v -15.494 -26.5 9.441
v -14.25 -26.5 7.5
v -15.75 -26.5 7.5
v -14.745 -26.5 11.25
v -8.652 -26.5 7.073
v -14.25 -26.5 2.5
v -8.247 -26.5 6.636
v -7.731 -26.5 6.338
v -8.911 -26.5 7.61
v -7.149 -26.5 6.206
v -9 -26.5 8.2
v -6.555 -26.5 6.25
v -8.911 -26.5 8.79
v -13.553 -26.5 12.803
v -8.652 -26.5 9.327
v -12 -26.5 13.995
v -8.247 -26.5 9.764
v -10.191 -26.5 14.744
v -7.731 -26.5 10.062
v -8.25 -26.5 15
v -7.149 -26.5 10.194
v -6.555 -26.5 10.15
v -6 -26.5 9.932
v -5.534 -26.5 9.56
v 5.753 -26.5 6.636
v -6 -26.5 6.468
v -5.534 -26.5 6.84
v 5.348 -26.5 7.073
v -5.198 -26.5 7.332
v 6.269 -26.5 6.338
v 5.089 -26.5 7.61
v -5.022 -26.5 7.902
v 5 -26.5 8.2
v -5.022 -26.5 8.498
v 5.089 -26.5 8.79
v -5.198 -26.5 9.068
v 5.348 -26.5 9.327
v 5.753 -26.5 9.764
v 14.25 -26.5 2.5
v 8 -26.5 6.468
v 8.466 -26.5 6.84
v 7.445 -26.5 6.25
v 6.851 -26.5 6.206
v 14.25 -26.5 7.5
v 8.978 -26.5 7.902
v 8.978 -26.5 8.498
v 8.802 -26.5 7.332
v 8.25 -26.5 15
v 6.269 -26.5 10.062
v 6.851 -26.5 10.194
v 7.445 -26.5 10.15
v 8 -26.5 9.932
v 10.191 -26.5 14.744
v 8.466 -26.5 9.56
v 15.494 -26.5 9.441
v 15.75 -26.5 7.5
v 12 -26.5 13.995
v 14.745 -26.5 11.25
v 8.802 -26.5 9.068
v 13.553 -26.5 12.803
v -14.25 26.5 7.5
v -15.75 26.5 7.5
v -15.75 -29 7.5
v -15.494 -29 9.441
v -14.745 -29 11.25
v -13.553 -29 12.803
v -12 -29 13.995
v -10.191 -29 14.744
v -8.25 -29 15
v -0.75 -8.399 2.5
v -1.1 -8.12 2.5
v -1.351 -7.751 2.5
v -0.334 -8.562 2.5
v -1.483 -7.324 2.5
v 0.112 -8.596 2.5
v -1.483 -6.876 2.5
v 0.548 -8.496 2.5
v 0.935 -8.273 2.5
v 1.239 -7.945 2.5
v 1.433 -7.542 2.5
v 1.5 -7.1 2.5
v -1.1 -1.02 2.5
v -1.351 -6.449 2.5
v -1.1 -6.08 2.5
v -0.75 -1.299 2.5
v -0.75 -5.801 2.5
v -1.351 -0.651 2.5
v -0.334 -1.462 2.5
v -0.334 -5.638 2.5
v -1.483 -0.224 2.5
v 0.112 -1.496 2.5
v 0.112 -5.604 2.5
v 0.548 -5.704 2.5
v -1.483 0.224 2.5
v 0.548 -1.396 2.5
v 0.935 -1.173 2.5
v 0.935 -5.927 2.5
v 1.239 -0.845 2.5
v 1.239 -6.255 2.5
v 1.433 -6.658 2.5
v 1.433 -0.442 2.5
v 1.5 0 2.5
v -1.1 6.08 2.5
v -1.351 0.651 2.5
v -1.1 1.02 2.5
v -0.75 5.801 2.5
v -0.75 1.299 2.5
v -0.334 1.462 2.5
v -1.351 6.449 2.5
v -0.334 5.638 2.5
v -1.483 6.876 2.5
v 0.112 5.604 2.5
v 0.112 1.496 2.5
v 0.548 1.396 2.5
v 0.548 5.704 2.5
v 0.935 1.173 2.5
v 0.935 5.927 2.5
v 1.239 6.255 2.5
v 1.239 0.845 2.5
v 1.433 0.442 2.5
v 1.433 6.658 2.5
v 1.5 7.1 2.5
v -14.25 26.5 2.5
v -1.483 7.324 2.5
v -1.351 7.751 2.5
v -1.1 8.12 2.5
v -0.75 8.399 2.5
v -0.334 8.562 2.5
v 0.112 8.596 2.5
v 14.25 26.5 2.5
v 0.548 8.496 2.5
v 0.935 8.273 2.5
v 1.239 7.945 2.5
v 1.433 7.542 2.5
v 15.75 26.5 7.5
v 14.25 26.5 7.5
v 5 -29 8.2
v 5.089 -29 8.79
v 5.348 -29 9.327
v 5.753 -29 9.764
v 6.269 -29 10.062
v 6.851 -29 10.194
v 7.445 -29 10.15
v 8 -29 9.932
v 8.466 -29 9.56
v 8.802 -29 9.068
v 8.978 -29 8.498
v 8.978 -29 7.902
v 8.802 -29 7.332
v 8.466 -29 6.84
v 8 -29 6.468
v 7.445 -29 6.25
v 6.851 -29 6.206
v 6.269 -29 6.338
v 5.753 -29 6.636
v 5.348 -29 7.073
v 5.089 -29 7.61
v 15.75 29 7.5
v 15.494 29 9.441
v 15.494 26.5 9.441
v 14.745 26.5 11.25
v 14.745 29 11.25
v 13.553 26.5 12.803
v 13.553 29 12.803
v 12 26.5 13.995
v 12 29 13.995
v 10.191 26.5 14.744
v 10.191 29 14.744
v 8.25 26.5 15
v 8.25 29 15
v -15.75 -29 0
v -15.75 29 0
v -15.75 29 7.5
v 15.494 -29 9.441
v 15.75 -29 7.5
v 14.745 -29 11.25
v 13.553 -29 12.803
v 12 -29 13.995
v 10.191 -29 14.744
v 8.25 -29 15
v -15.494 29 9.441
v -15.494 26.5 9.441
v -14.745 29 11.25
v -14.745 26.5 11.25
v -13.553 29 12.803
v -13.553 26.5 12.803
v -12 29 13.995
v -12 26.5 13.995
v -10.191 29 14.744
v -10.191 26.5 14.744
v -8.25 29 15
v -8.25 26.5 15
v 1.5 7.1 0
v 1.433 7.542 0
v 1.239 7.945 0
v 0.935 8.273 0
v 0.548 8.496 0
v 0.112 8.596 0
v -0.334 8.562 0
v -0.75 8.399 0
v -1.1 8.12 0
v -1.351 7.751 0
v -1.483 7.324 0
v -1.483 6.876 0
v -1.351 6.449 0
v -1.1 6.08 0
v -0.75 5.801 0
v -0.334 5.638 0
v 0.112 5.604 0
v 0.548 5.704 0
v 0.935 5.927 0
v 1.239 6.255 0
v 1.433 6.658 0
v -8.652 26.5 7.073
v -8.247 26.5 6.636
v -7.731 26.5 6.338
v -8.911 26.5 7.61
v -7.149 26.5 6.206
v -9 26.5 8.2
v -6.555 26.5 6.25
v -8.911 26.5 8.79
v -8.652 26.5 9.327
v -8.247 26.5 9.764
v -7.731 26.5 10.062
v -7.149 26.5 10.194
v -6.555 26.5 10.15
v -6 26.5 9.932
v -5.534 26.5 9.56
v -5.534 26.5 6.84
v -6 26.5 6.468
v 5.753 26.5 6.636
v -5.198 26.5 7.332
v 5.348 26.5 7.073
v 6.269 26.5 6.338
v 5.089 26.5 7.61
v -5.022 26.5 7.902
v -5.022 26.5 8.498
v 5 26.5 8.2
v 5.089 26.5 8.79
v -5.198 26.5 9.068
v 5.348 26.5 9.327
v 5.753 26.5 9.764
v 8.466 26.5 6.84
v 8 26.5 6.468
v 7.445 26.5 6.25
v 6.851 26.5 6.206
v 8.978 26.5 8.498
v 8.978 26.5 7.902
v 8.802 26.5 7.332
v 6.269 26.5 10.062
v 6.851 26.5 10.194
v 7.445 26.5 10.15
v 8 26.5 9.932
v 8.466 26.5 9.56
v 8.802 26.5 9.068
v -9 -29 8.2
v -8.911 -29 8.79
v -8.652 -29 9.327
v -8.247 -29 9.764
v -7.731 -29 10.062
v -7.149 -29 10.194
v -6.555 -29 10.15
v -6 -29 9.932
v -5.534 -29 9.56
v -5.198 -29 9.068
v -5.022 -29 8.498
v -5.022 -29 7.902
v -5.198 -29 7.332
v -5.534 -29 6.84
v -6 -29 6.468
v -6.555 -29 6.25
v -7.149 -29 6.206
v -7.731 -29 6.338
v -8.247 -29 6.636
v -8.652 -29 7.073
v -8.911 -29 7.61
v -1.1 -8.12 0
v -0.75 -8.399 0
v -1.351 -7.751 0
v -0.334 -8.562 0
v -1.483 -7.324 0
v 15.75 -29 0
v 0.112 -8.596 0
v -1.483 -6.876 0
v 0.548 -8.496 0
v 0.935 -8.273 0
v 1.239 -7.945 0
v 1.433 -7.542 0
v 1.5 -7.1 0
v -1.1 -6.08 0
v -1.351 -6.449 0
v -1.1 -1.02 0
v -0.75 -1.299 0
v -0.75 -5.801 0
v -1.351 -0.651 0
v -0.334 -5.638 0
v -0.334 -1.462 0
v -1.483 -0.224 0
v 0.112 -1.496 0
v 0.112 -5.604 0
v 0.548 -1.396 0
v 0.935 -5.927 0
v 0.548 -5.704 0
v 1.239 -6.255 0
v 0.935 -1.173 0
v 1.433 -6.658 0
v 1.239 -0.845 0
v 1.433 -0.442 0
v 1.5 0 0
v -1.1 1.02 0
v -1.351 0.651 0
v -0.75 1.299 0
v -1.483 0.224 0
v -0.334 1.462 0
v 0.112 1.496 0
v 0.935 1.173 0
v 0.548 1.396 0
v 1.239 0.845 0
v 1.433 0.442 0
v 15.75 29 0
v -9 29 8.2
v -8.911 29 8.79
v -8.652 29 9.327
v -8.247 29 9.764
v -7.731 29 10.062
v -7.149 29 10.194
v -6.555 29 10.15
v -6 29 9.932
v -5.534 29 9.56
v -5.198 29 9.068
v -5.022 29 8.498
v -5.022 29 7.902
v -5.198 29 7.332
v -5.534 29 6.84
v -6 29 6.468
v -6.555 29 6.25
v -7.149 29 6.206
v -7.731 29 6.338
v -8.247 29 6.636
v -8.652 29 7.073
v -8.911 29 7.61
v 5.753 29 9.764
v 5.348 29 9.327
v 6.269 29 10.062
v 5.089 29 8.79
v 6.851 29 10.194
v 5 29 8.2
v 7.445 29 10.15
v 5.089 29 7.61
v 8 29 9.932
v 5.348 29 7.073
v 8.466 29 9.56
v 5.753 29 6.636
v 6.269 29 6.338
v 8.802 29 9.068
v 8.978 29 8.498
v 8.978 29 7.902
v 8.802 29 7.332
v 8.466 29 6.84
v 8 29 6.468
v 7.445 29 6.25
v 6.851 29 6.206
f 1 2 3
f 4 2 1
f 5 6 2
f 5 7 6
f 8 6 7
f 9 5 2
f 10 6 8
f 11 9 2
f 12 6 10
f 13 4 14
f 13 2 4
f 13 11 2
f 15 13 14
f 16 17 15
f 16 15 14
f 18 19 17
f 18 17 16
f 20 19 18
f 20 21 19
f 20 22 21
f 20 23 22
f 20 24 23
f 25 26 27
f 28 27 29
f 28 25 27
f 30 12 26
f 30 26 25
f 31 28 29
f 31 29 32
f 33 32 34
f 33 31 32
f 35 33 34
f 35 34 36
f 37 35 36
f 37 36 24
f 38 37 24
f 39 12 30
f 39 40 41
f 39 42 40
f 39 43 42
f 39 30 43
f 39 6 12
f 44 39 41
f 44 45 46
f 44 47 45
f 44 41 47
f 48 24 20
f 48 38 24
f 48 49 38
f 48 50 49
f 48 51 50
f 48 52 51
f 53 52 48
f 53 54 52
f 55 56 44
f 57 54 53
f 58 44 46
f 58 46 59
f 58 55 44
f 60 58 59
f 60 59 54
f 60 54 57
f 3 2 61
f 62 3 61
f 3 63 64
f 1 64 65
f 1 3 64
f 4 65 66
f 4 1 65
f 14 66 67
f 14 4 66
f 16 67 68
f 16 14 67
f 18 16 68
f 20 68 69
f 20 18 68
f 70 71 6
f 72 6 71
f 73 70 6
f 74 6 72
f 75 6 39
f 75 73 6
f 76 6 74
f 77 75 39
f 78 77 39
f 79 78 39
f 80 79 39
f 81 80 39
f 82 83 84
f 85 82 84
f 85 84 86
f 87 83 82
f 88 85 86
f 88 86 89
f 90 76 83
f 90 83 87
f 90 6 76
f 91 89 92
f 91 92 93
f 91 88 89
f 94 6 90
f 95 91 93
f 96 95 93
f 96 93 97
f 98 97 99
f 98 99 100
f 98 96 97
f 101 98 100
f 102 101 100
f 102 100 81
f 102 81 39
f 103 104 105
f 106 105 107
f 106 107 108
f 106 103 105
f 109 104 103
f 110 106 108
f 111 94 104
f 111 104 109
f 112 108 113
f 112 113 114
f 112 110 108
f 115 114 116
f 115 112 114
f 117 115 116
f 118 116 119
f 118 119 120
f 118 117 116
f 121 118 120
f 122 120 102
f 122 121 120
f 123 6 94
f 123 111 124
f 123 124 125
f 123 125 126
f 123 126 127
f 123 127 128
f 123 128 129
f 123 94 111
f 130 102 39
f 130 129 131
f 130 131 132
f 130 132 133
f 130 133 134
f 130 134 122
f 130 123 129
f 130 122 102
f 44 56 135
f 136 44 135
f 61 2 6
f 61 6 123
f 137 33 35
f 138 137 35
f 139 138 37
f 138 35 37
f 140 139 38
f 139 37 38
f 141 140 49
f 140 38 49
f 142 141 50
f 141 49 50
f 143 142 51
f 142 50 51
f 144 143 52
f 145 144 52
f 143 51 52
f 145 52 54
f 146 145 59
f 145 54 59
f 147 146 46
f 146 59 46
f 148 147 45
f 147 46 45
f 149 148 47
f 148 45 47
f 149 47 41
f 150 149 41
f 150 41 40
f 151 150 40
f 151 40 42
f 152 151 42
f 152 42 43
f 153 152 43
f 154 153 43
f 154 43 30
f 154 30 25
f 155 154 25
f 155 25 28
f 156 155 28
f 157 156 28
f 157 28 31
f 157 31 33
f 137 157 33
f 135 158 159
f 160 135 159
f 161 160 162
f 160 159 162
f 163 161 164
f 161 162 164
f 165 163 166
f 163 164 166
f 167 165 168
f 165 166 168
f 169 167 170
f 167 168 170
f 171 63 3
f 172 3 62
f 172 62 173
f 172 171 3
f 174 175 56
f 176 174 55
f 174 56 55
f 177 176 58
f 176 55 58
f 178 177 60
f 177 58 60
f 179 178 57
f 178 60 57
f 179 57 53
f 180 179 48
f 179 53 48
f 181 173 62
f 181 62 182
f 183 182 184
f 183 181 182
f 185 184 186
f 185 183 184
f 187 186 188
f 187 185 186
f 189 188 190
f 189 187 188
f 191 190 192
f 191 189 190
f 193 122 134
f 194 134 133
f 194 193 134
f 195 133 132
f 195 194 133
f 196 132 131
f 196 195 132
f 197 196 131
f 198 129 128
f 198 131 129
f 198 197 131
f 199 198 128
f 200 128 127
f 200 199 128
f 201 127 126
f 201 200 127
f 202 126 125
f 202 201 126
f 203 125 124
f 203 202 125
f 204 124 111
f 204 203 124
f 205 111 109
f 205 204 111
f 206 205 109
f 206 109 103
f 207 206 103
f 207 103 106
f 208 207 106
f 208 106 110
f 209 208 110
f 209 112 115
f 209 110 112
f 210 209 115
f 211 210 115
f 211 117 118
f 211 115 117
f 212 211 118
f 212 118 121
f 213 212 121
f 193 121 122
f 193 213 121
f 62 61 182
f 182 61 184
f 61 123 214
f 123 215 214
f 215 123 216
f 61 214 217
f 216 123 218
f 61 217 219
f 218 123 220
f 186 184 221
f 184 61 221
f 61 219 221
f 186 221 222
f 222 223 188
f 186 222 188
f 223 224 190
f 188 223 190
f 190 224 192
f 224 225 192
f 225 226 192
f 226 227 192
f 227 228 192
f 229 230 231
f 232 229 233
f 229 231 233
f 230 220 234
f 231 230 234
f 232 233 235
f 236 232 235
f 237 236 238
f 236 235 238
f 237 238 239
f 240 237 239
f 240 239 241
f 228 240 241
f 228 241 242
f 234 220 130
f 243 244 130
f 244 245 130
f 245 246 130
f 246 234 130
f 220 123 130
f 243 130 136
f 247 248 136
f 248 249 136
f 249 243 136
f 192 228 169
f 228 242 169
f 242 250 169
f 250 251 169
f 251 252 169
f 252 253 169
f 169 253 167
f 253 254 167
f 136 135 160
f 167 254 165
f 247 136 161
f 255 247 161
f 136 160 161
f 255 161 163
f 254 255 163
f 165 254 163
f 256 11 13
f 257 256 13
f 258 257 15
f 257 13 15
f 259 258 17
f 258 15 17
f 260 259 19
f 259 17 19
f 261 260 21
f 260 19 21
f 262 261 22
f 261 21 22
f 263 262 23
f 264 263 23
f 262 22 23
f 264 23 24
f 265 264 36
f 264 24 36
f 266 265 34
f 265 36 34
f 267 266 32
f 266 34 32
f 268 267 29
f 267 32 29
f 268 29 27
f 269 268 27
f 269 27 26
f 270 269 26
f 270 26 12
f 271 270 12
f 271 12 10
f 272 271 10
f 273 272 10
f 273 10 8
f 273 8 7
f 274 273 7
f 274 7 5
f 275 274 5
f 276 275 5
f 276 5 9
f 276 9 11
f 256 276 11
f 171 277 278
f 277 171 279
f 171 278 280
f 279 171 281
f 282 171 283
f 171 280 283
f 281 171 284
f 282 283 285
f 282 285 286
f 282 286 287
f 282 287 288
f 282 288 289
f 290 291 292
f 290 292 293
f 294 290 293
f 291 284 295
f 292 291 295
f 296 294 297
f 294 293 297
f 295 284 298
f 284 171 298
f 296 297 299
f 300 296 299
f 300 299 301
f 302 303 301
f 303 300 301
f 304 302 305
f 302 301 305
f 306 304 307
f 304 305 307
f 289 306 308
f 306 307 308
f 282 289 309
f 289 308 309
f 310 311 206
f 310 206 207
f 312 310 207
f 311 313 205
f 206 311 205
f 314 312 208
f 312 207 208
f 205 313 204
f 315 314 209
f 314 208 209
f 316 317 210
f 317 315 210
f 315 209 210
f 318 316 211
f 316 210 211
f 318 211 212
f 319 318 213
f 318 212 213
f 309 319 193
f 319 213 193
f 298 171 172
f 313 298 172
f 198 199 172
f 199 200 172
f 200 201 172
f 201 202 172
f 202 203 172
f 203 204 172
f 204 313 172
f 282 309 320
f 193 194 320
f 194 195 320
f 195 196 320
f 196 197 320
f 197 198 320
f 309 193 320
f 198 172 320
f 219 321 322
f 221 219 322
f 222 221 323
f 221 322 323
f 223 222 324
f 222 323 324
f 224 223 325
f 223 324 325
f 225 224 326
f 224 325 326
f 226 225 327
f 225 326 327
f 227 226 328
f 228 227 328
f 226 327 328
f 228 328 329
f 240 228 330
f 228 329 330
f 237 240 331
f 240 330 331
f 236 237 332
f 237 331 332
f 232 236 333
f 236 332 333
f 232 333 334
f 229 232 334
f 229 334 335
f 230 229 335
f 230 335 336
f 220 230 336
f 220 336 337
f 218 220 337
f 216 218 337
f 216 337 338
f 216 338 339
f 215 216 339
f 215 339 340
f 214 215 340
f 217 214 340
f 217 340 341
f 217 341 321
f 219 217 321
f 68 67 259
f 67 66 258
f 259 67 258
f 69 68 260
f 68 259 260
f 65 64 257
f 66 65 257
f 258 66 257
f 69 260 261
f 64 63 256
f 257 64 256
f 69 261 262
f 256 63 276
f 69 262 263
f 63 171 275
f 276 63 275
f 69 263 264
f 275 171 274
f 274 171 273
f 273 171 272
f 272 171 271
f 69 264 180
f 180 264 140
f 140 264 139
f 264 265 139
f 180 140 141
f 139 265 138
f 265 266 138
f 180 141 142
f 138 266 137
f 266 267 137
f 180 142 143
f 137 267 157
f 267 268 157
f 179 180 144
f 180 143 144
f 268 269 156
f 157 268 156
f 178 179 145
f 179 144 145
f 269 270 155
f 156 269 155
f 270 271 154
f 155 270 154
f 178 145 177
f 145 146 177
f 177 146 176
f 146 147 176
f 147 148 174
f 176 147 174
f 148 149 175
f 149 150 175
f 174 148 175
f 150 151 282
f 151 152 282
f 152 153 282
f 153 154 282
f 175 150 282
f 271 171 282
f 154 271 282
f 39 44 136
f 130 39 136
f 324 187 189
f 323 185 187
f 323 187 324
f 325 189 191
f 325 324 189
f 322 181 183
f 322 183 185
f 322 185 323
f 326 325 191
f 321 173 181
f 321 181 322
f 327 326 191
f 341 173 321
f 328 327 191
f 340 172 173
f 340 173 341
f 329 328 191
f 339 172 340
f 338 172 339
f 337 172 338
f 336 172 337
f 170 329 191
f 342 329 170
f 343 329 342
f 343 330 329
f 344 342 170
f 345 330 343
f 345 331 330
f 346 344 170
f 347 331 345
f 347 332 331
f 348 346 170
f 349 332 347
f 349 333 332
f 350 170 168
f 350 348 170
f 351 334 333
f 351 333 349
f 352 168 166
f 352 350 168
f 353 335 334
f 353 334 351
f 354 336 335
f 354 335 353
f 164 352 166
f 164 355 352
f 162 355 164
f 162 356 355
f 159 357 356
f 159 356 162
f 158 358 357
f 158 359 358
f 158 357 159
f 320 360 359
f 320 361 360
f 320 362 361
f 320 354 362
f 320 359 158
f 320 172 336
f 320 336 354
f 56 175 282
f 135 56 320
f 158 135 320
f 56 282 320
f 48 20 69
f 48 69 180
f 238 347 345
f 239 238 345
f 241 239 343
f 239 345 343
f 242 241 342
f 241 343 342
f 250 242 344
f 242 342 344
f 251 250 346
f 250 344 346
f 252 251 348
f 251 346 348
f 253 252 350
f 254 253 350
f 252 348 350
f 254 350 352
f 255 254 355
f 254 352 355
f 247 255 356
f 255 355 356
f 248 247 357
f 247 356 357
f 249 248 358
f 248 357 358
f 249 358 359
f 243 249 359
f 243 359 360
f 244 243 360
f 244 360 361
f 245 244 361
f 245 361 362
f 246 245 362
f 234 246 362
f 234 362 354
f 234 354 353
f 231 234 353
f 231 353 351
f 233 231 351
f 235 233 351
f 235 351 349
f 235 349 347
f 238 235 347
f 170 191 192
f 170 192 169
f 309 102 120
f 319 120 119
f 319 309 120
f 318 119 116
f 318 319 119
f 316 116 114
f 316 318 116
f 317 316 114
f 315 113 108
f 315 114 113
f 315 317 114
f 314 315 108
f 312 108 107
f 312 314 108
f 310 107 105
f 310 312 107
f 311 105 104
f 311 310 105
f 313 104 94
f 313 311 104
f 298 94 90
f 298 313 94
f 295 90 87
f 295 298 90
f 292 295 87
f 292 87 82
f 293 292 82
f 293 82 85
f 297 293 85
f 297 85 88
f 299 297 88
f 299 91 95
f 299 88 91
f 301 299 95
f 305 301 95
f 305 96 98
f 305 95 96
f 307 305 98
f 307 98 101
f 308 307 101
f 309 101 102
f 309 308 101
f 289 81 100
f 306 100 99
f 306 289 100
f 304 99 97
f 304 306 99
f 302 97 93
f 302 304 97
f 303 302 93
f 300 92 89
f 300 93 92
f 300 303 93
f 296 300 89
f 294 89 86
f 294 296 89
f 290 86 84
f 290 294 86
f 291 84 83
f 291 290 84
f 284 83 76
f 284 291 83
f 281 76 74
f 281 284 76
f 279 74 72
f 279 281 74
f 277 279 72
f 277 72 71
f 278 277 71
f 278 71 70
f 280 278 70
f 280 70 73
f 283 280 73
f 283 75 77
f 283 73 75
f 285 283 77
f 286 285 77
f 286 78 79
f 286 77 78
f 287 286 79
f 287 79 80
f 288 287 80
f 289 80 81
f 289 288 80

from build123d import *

# Parameters (mm, degrees)
SKETCH_W          = 31.5
SKETCH_H          = 58
PAD_DEPTH         = 15
FILLET_R          = 7.5
SKETCH001_W       = 53
SKETCH001_H       = 15
POCKET_DEPTH      = 15.751
POCKET_DEPTH_BACK = 15.751
SKETCH002_W       = 28.5
SKETCH002_H       = 53
POCKET001_DEPTH   = 5
SKETCH003_R       = 1.5
POCKET002_DEPTH   = 15.001
SKETCH004_R       = 2
POCKET003_DEPTH   = 58.001


with BuildPart() as part:
    # Sketch → Pad (new body)
    with BuildSketch(Plane.XY):
        Rectangle(SKETCH_W, SKETCH_H)
    extrude(amount=PAD_DEPTH)

    # Fillet
    fillet_edges = [part.edges().sort_by_distance(p)[0] for p in [
        (15.75, 0, 15),
        (-15.75, 0, 15),
    ]]
    fillet(fillet_edges, radius=FILLET_R)

    # Sketch001 → Pocket (cut, two sides)
    with BuildSketch(Plane.YZ) as pocket_sk:
        with Locations((0, 15)):
            Rectangle(SKETCH001_W, SKETCH001_H)
    extrude(amount=-POCKET_DEPTH, mode=Mode.SUBTRACT)
    extrude(pocket_sk.sketch, amount=POCKET_DEPTH_BACK, mode=Mode.SUBTRACT)

    # Sketch002 (on DatumPlane) → Pocket001 (cut)
    with BuildSketch(Plane.XY.offset(7.5)):
        Rectangle(SKETCH002_W, SKETCH002_H)
    extrude(amount=-POCKET001_DEPTH, mode=Mode.SUBTRACT)

    # Sketch003 → Pocket002 (cut, through all)
    with BuildSketch(Plane.XY):
        with Locations((0, 7.1)):
            Circle(SKETCH003_R)
        Circle(SKETCH003_R)
        with Locations((0, -7.1)):
            Circle(SKETCH003_R)
    extrude(amount=POCKET002_DEPTH, mode=Mode.SUBTRACT)

    # Sketch004 (on Face1 of Pocket002) → Pocket003 (cut, through all)
    with BuildSketch(Plane(origin=(0, 29, 0), x_dir=(-1, 0, 0), z_dir=(0, 1, 0))):
        with Locations((-7, 8.2)):
            Circle(SKETCH004_R)
        with Locations((7, 8.2)):
            Circle(SKETCH004_R)
    extrude(amount=-POCKET003_DEPTH, mode=Mode.SUBTRACT)


solid = part.part
